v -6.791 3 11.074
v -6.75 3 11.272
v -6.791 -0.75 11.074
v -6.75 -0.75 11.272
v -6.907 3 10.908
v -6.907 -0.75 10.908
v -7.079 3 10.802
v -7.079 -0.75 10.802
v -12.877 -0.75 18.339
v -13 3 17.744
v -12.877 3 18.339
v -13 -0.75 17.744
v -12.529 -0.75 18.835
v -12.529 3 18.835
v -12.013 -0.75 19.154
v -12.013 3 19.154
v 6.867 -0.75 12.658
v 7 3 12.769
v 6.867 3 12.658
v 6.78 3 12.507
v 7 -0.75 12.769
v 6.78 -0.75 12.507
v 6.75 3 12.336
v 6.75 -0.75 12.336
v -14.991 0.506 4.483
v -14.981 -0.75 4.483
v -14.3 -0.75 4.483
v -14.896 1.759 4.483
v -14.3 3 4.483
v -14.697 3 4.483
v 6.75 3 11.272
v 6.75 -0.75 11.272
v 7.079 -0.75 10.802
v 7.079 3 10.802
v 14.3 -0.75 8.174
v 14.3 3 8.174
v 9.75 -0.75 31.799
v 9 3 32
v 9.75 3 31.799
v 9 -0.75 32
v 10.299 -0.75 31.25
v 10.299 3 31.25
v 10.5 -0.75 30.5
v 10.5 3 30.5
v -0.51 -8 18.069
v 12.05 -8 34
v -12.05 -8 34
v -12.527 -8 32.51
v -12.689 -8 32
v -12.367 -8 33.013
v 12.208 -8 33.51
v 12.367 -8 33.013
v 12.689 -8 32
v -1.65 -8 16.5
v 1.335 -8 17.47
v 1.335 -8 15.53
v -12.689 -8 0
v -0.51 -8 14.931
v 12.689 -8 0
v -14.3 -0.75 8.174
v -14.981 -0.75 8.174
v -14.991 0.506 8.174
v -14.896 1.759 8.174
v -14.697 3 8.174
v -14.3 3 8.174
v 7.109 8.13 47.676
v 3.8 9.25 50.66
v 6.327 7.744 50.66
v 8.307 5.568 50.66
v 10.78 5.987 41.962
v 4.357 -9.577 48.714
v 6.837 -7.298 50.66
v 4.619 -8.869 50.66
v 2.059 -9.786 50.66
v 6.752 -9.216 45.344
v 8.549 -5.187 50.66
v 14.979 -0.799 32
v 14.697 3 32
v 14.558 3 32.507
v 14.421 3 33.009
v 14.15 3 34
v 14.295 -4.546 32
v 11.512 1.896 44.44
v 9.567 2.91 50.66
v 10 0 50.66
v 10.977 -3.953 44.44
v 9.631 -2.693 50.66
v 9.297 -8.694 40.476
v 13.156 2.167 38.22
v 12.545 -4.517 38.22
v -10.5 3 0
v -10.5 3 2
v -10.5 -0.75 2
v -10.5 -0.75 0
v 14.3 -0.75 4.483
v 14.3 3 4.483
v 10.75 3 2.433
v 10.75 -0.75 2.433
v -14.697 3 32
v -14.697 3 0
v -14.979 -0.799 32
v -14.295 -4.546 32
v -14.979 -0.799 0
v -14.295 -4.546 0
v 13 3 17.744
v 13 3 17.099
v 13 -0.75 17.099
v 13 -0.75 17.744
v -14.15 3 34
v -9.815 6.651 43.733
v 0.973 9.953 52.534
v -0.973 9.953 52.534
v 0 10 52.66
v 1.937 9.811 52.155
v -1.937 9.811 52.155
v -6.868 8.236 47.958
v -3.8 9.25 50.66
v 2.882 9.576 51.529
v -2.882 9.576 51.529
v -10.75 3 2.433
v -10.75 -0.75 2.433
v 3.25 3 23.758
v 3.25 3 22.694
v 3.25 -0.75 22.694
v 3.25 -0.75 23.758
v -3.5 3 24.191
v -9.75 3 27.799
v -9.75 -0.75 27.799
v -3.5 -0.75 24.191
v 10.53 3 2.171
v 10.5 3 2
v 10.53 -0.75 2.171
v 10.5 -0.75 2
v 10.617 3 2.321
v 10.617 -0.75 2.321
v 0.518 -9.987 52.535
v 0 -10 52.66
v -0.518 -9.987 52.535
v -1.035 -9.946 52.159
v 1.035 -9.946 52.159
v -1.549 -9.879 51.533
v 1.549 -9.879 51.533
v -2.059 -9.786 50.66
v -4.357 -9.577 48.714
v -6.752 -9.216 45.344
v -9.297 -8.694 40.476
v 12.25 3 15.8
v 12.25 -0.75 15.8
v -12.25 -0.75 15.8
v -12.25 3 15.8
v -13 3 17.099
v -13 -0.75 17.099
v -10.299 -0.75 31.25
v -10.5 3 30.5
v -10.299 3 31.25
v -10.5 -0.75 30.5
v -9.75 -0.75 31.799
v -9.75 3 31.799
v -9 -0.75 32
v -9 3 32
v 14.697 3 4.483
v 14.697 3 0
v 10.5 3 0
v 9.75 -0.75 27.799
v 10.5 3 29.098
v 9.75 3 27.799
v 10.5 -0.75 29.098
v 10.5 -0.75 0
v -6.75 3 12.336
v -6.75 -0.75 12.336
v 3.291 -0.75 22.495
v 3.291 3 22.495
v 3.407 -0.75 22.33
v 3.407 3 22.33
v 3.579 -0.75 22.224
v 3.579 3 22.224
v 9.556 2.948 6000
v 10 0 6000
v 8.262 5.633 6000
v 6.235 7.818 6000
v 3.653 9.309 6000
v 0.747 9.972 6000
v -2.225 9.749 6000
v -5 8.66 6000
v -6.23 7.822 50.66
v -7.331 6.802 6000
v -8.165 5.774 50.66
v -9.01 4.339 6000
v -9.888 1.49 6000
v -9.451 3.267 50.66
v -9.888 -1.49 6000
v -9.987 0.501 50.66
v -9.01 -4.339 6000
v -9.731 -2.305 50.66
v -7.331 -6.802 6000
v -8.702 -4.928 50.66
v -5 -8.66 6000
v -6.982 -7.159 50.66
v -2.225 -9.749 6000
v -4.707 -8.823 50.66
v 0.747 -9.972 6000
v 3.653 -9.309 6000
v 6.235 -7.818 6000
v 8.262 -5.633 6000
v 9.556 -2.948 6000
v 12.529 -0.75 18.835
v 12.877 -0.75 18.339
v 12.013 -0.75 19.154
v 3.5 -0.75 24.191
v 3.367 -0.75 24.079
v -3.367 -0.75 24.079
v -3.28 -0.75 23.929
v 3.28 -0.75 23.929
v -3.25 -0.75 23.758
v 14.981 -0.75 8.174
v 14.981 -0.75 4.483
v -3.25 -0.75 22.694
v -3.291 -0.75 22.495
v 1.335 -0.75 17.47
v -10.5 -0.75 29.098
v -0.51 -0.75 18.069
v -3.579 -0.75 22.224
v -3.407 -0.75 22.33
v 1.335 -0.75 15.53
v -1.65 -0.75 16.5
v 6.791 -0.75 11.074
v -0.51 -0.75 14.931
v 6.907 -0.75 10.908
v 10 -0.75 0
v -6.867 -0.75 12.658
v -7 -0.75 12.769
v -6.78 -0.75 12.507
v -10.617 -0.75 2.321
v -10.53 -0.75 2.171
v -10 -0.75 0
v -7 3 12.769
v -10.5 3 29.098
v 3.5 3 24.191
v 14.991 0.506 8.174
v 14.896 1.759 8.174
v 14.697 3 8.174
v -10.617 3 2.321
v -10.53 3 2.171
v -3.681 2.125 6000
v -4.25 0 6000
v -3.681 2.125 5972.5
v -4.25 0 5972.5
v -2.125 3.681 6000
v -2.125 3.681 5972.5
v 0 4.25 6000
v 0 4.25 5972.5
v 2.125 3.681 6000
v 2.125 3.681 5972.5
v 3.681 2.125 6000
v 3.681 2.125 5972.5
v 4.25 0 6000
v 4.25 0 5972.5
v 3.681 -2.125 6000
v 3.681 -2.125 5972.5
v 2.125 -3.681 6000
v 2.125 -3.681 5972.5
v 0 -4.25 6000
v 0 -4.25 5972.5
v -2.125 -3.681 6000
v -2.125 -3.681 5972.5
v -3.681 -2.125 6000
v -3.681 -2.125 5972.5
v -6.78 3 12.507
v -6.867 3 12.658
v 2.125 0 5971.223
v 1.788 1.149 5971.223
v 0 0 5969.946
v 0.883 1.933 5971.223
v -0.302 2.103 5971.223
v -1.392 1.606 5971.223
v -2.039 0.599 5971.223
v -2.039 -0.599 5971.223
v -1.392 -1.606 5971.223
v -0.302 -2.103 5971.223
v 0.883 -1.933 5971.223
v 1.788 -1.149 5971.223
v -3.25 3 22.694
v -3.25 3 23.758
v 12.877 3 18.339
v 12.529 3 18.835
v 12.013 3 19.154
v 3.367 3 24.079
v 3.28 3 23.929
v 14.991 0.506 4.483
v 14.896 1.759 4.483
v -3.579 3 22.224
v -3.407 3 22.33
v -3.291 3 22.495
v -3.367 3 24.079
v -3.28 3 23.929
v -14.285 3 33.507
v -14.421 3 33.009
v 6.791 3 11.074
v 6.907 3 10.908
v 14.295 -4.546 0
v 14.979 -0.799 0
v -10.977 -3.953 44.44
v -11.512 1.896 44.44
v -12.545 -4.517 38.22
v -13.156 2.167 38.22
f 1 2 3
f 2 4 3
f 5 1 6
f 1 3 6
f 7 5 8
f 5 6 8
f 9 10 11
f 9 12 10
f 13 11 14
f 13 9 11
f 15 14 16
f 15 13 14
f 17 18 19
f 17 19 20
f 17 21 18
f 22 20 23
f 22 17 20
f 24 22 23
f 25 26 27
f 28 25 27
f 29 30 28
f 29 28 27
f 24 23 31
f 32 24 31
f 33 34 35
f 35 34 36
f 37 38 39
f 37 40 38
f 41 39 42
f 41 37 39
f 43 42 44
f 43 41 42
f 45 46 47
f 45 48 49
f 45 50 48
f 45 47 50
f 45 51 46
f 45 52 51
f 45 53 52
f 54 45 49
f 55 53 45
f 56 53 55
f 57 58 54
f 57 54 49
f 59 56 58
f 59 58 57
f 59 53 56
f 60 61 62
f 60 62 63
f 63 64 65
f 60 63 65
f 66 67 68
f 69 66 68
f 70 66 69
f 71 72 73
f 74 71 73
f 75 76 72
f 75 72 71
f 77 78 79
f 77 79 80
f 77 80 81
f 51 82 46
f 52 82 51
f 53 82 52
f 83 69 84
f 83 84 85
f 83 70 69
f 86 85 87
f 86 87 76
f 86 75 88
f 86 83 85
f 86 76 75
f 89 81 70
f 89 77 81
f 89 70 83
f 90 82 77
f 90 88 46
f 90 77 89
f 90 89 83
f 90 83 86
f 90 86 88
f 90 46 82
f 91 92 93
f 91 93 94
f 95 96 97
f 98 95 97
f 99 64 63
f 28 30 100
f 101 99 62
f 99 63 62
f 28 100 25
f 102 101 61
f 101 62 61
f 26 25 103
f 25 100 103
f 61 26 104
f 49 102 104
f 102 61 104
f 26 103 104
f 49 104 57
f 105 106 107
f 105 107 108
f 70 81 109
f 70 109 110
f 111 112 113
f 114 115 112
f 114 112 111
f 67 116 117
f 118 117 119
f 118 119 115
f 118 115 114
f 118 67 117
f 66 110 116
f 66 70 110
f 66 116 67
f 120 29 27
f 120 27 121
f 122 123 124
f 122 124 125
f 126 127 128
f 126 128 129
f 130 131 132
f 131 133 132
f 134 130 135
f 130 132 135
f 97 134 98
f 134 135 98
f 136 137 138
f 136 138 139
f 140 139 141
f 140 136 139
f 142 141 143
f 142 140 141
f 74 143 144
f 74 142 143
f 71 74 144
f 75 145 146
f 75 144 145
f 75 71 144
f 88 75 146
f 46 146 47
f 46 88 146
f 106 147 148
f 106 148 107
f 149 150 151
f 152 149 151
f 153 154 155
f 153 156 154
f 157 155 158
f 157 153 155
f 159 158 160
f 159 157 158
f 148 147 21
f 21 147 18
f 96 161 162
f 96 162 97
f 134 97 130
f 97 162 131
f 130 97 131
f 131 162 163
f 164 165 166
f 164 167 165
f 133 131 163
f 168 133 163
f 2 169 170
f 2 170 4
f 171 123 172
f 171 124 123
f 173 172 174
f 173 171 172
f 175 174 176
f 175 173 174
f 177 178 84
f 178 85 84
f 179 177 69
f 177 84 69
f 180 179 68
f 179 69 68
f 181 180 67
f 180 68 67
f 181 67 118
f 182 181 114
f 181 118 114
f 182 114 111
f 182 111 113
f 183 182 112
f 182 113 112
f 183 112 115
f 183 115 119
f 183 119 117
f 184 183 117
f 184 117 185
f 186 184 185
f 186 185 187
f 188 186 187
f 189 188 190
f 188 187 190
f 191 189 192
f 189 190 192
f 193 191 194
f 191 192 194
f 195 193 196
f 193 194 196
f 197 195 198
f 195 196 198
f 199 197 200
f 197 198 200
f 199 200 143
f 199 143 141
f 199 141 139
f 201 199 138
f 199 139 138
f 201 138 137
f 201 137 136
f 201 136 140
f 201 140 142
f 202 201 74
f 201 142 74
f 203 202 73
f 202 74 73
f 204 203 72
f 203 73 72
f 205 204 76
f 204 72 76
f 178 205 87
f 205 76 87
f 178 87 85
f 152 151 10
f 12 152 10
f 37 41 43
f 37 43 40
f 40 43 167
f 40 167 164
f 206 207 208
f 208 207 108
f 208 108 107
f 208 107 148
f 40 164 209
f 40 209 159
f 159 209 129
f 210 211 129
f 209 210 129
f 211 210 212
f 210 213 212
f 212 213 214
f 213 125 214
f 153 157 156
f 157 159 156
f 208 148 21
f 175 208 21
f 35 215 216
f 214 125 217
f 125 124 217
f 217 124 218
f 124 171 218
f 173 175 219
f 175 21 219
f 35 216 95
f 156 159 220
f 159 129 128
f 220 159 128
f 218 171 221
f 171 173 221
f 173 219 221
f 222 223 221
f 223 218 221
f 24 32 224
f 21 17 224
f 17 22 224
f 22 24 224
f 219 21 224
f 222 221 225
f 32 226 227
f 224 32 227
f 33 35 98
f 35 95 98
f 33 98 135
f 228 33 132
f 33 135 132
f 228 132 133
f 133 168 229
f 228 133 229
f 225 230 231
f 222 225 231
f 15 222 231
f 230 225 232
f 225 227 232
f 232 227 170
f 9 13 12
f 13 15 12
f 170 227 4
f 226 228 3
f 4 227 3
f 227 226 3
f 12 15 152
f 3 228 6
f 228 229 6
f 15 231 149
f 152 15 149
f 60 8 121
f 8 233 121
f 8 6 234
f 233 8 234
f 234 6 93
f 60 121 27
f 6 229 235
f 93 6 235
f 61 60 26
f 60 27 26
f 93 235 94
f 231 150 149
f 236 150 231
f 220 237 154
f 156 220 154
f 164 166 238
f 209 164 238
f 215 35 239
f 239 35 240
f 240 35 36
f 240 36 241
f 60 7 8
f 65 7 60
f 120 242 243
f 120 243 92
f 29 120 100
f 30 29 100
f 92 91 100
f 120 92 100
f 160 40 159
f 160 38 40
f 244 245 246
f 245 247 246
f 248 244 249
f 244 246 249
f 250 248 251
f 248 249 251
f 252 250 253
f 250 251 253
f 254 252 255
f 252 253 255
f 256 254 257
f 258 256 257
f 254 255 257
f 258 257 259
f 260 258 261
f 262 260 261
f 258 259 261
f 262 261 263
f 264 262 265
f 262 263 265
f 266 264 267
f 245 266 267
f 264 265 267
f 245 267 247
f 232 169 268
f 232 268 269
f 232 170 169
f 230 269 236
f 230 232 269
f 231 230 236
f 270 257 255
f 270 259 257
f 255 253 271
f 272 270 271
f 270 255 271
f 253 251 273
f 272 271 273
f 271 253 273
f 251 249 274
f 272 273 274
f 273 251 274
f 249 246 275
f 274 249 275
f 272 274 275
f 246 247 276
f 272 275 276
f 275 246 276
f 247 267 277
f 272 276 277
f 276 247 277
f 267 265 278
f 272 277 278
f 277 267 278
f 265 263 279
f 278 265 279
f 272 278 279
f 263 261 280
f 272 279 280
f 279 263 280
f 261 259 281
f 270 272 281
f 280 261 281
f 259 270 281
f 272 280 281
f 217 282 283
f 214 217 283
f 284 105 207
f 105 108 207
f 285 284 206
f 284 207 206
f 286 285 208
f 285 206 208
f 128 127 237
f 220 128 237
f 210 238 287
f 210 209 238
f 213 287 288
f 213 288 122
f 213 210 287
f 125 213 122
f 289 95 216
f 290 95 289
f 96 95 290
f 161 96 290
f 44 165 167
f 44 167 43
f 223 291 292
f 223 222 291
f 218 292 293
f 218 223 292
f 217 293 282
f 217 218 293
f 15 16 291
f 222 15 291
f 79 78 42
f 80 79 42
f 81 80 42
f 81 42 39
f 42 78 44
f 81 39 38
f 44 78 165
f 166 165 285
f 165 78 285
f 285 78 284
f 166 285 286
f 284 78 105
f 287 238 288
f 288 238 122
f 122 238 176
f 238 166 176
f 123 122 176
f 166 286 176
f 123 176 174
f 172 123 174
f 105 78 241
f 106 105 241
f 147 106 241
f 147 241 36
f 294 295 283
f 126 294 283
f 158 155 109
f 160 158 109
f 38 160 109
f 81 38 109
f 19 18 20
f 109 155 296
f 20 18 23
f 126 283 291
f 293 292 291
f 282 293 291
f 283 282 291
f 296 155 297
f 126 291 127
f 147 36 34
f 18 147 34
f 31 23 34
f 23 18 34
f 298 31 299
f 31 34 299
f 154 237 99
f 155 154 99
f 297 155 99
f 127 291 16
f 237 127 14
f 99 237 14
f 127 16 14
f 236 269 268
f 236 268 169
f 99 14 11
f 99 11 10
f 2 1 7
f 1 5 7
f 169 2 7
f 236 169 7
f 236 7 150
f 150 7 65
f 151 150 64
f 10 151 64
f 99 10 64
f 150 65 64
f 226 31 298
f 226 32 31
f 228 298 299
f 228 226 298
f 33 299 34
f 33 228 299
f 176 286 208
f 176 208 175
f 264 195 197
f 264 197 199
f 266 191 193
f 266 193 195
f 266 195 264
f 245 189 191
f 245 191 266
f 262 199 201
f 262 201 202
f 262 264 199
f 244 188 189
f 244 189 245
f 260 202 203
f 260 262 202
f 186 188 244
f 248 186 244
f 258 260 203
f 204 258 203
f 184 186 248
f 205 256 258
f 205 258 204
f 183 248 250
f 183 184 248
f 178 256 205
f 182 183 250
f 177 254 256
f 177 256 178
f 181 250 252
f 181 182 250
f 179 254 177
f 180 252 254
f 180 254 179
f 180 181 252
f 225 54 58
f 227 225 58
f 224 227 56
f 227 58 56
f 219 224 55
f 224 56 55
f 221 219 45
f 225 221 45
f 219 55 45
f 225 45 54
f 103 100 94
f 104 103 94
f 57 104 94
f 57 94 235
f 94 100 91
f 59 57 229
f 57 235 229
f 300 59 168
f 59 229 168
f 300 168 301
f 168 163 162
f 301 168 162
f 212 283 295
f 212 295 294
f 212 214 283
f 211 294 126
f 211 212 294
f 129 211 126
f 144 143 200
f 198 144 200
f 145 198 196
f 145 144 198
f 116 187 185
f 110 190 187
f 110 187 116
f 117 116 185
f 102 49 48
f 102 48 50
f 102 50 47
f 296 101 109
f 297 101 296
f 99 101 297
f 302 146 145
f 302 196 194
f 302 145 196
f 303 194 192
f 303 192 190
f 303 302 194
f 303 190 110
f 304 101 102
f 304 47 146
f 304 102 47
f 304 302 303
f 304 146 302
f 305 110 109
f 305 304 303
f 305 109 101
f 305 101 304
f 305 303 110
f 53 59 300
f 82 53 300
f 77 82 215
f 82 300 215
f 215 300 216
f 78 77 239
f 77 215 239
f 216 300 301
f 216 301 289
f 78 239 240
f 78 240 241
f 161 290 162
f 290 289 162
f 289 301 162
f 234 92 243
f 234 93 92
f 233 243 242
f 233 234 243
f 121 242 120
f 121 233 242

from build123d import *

# Parameters (mm, degrees)
ESQUISSE1_R            = 15
BOSS_EXTRU_1_DEPTH     = 450
SKETCH4_W              = 29.393876914
SKETCH4_H              = 12
CUT_EXTRUDE1_DEPTH     = 32
CUT_EXTRUDE2_DEPTH     = 3.75
SKETCH6_W              = 0.5
SKETCH6_H              = 2.288675135
CUT_EXTRUDE3_DEPTH     = 3.75
FILLET1_R              = 0.5
FILLET2_R              = 1.5
CUT_EXTRUDE4_DEPTH     = 15
CUT_EXTRUDE5_DEPTH     = 15
SKETCH11_W             = 0.7
SKETCH11_H             = 0.404145188
SKETCH11_H_2           = 1.772825297
CUT_EXTRUDE7_DEPTH     = 3.75
SKETCH12_R             = 10
BOSS_EXTRUDE1_DEPTH    = 5550
M10_TAPPED_HOLE1_D     = 8.5
M10_TAPPED_HOLE1_DEPTH = 27.5
M10_TAPPED_HOLE1_TIP   = 2.553657631
M4_TAPPED_HOLE1_D      = 3.3
M4_TAPPED_HOLE1_DEPTH  = 11.5
M4_TAPPED_HOLE1_TIP    = 0.991420021


with BuildPart() as part:
    # Esquisse1 → Boss.-Extru.1 (new body)
    with BuildSketch(Plane.XY):
        Circle(ESQUISSE1_R)
    extrude(amount=BOSS_EXTRU_1_DEPTH)

    # Sketch4 → Cut-Extrude1 (cut)
    with BuildSketch(Plane(origin=(0, 0, 0), x_dir=(-1, 0, 0), z_dir=(0, 0, -1))):
        with Locations((0, 9)):
            Rectangle(SKETCH4_W, SKETCH4_H)
    extrude(amount=-CUT_EXTRUDE1_DEPTH, mode=Mode.SUBTRACT)

    # Sketch5 → Cut-Extrude2 (cut)
    with BuildSketch(Plane(origin=(0, 3, 0), x_dir=(1, 0, 0), z_dir=(0, 1, 0))):
        Polygon((0, 0), (0, -32), (-10, -32), (-10, -27.943769062), (-3, -23.902317178), (-3, -21.902317178), (-12.5, -18.444599952), (-12.5, -15.944599952), (-6.5, -12.480498337), (-6.5, -10.480498337), (-15, -7.386751346), (-15, -4.886751346), (-10, -2), (-10, 0), align=None)
    cut_extrude2 = extrude(amount=-CUT_EXTRUDE2_DEPTH, mode=Mode.SUBTRACT)

    # Sketch6 → Cut-Extrude3 (cut)
    with BuildSketch(Plane(origin=(0, 3, 0), x_dir=(1, 0, 0), z_dir=(0, 1, 0))):
        with Locations((-10.25, -1.144337568)):
            Rectangle(SKETCH6_W, SKETCH6_H)
        Polygon((-6.75, -12.624835905), (-6.75, -10.921594665), (-15, -7.918840232), (-15, -7.386751346), (-6.5, -10.480498337), (-6.5, -12.480498337), align=None)
        Polygon((-12.5, -15.944599952), (-13, -16.233275087), (-13, -18.794703721), (-3.25, -22.343413506), (-3.25, -24.046654745), (-3, -23.902317178), (-3, -21.902317178), (-12.5, -18.444599952), align=None)
        Polygon((-10, -32), (-10, -27.943769062), (-10.5, -28.232444197), (-10.5, -32), align=None)
    cut_extrude3 = extrude(amount=-CUT_EXTRUDE3_DEPTH, mode=Mode.SUBTRACT)

    # Mirror2: Cut-Extrude2, Cut-Extrude3 across plane
    add(cut_extrude2.mirror(Plane(origin=(0, 0, 0), x_dir=(0, 0, 1), z_dir=(1, 0, 0))), mode=Mode.SUBTRACT)
    add(cut_extrude3.mirror(Plane(origin=(0, 0, 0), x_dir=(0, 0, 1), z_dir=(1, 0, 0))), mode=Mode.SUBTRACT)

    # Fillet1
    fillet1_edges = [part.edges().sort_by_distance(p)[0] for p in [
        (-3.25, 1.125, 22.343413506),
        (-3.25, 1.125, 24.046654745),
        (10.5, 1.125, 2.288675135),
        (6.75, 1.125, 12.624835905),
        (6.75, 1.125, 10.921594665),
        (3.25, 1.125, 22.343413506),
        (3.25, 1.125, 24.046654745),
        (-10.5, 1.125, 2.288675135),
        (-6.75, 1.125, 10.921594665),
        (-6.75, 1.125, 12.624835905),
    ]]
    fillet(fillet1_edges, radius=FILLET1_R)

    # Fillet2
    fillet2_edges = [part.edges().sort_by_distance(p)[0] for p in [
        (-13, 1.125, 16.233275087),
        (-13, 1.125, 18.794703721),
        (-10.5, 1.125, 28.232444197),
        (-10.5, 1.125, 32),
        (13, 1.125, 16.233275087),
        (13, 1.125, 18.794703721),
        (10.5, 1.125, 32),
        (10.5, 1.125, 28.232444197),
    ]]
    fillet(fillet2_edges, radius=FILLET2_R)

    # Sketch7 → Cut-Revolve1 (revolve, cut)
    with BuildSketch(Plane(origin=(0, 0, 0), x_dir=(1, 0, 0), z_dir=(0, 1, 0))):
        Polygon((10, -450), (10, -50.660254038), (15, -32), (15, -450), align=None)
    revolve(axis=Axis((0, 0, 450), (0, 0, -1)), mode=Mode.SUBTRACT)

    # Sketch8 → Cut-Extrude4 (cut, symmetric)
    with BuildSketch(Plane(origin=(0, 0, 0), x_dir=(0, 0, -1), z_dir=(1, 0, 0))):
        Polygon((-52.660254038, 10), (-32, 15), (-32, 10), (-32, 3), (-34, 3), align=None)
    extrude(amount=CUT_EXTRUDE4_DEPTH, both=True, mode=Mode.SUBTRACT)

    # Sketch9 → Cut-Extrude5 (cut, symmetric)
    with BuildSketch(Plane(origin=(0, 0, 0), x_dir=(0, 0, -1), z_dir=(1, 0, 0))):
        Polygon((0, -8), (0, -15), (-52.660254038, -15), (-52.660254038, -10), (-34, -8), align=None)
    extrude(amount=CUT_EXTRUDE5_DEPTH, both=True, mode=Mode.SUBTRACT)

    # Sketch11 → Cut-Extrude7 (cut)
    with BuildSketch(Plane(origin=(0, 3, 0), x_dir=(1, 0, 0), z_dir=(0, 1, 0))):
        with Locations((14.65, -4.684678752)):
            Rectangle(SKETCH11_W, SKETCH11_H)
        with Locations((-14.65, -4.684678752)):
            Rectangle(SKETCH11_W, SKETCH11_H)
        with Locations((14.65, -7.287206748)):
            Rectangle(SKETCH11_W, SKETCH11_H_2)
        with Locations((-14.65, -7.287206748)):
            Rectangle(SKETCH11_W, SKETCH11_H_2)
    extrude(amount=-CUT_EXTRUDE7_DEPTH, mode=Mode.SUBTRACT)

    # Sketch12 → Boss-Extrude1 (add)
    with BuildSketch(Plane.XY.offset(450)):
        Circle(SKETCH12_R)
    extrude(amount=BOSS_EXTRUDE1_DEPTH)

    # M10 Tapped Hole1
    with Locations(Plane.XY.offset(6000)):
        with Locations((0, 0)):
            Hole(M10_TAPPED_HOLE1_D / 2, depth=M10_TAPPED_HOLE1_DEPTH)
            with Locations((0, 0, -(M10_TAPPED_HOLE1_DEPTH + M10_TAPPED_HOLE1_TIP / 2))):  # 118° drill point
                Cone(0, M10_TAPPED_HOLE1_D / 2, M10_TAPPED_HOLE1_TIP, mode=Mode.SUBTRACT)

    # M4 Tapped Hole1
    with Locations(Plane(origin=(0, -0.75, 0), x_dir=(1, 0, 0), z_dir=(0, 1, 0))):
        with Locations((0, -16.5)):
            Hole(M4_TAPPED_HOLE1_D / 2, depth=M4_TAPPED_HOLE1_DEPTH)
            with Locations((0, 0, -(M4_TAPPED_HOLE1_DEPTH + M4_TAPPED_HOLE1_TIP / 2))):  # 118° drill point
                Cone(0, M4_TAPPED_HOLE1_D / 2, M4_TAPPED_HOLE1_TIP, mode=Mode.SUBTRACT)


solid = part.part
